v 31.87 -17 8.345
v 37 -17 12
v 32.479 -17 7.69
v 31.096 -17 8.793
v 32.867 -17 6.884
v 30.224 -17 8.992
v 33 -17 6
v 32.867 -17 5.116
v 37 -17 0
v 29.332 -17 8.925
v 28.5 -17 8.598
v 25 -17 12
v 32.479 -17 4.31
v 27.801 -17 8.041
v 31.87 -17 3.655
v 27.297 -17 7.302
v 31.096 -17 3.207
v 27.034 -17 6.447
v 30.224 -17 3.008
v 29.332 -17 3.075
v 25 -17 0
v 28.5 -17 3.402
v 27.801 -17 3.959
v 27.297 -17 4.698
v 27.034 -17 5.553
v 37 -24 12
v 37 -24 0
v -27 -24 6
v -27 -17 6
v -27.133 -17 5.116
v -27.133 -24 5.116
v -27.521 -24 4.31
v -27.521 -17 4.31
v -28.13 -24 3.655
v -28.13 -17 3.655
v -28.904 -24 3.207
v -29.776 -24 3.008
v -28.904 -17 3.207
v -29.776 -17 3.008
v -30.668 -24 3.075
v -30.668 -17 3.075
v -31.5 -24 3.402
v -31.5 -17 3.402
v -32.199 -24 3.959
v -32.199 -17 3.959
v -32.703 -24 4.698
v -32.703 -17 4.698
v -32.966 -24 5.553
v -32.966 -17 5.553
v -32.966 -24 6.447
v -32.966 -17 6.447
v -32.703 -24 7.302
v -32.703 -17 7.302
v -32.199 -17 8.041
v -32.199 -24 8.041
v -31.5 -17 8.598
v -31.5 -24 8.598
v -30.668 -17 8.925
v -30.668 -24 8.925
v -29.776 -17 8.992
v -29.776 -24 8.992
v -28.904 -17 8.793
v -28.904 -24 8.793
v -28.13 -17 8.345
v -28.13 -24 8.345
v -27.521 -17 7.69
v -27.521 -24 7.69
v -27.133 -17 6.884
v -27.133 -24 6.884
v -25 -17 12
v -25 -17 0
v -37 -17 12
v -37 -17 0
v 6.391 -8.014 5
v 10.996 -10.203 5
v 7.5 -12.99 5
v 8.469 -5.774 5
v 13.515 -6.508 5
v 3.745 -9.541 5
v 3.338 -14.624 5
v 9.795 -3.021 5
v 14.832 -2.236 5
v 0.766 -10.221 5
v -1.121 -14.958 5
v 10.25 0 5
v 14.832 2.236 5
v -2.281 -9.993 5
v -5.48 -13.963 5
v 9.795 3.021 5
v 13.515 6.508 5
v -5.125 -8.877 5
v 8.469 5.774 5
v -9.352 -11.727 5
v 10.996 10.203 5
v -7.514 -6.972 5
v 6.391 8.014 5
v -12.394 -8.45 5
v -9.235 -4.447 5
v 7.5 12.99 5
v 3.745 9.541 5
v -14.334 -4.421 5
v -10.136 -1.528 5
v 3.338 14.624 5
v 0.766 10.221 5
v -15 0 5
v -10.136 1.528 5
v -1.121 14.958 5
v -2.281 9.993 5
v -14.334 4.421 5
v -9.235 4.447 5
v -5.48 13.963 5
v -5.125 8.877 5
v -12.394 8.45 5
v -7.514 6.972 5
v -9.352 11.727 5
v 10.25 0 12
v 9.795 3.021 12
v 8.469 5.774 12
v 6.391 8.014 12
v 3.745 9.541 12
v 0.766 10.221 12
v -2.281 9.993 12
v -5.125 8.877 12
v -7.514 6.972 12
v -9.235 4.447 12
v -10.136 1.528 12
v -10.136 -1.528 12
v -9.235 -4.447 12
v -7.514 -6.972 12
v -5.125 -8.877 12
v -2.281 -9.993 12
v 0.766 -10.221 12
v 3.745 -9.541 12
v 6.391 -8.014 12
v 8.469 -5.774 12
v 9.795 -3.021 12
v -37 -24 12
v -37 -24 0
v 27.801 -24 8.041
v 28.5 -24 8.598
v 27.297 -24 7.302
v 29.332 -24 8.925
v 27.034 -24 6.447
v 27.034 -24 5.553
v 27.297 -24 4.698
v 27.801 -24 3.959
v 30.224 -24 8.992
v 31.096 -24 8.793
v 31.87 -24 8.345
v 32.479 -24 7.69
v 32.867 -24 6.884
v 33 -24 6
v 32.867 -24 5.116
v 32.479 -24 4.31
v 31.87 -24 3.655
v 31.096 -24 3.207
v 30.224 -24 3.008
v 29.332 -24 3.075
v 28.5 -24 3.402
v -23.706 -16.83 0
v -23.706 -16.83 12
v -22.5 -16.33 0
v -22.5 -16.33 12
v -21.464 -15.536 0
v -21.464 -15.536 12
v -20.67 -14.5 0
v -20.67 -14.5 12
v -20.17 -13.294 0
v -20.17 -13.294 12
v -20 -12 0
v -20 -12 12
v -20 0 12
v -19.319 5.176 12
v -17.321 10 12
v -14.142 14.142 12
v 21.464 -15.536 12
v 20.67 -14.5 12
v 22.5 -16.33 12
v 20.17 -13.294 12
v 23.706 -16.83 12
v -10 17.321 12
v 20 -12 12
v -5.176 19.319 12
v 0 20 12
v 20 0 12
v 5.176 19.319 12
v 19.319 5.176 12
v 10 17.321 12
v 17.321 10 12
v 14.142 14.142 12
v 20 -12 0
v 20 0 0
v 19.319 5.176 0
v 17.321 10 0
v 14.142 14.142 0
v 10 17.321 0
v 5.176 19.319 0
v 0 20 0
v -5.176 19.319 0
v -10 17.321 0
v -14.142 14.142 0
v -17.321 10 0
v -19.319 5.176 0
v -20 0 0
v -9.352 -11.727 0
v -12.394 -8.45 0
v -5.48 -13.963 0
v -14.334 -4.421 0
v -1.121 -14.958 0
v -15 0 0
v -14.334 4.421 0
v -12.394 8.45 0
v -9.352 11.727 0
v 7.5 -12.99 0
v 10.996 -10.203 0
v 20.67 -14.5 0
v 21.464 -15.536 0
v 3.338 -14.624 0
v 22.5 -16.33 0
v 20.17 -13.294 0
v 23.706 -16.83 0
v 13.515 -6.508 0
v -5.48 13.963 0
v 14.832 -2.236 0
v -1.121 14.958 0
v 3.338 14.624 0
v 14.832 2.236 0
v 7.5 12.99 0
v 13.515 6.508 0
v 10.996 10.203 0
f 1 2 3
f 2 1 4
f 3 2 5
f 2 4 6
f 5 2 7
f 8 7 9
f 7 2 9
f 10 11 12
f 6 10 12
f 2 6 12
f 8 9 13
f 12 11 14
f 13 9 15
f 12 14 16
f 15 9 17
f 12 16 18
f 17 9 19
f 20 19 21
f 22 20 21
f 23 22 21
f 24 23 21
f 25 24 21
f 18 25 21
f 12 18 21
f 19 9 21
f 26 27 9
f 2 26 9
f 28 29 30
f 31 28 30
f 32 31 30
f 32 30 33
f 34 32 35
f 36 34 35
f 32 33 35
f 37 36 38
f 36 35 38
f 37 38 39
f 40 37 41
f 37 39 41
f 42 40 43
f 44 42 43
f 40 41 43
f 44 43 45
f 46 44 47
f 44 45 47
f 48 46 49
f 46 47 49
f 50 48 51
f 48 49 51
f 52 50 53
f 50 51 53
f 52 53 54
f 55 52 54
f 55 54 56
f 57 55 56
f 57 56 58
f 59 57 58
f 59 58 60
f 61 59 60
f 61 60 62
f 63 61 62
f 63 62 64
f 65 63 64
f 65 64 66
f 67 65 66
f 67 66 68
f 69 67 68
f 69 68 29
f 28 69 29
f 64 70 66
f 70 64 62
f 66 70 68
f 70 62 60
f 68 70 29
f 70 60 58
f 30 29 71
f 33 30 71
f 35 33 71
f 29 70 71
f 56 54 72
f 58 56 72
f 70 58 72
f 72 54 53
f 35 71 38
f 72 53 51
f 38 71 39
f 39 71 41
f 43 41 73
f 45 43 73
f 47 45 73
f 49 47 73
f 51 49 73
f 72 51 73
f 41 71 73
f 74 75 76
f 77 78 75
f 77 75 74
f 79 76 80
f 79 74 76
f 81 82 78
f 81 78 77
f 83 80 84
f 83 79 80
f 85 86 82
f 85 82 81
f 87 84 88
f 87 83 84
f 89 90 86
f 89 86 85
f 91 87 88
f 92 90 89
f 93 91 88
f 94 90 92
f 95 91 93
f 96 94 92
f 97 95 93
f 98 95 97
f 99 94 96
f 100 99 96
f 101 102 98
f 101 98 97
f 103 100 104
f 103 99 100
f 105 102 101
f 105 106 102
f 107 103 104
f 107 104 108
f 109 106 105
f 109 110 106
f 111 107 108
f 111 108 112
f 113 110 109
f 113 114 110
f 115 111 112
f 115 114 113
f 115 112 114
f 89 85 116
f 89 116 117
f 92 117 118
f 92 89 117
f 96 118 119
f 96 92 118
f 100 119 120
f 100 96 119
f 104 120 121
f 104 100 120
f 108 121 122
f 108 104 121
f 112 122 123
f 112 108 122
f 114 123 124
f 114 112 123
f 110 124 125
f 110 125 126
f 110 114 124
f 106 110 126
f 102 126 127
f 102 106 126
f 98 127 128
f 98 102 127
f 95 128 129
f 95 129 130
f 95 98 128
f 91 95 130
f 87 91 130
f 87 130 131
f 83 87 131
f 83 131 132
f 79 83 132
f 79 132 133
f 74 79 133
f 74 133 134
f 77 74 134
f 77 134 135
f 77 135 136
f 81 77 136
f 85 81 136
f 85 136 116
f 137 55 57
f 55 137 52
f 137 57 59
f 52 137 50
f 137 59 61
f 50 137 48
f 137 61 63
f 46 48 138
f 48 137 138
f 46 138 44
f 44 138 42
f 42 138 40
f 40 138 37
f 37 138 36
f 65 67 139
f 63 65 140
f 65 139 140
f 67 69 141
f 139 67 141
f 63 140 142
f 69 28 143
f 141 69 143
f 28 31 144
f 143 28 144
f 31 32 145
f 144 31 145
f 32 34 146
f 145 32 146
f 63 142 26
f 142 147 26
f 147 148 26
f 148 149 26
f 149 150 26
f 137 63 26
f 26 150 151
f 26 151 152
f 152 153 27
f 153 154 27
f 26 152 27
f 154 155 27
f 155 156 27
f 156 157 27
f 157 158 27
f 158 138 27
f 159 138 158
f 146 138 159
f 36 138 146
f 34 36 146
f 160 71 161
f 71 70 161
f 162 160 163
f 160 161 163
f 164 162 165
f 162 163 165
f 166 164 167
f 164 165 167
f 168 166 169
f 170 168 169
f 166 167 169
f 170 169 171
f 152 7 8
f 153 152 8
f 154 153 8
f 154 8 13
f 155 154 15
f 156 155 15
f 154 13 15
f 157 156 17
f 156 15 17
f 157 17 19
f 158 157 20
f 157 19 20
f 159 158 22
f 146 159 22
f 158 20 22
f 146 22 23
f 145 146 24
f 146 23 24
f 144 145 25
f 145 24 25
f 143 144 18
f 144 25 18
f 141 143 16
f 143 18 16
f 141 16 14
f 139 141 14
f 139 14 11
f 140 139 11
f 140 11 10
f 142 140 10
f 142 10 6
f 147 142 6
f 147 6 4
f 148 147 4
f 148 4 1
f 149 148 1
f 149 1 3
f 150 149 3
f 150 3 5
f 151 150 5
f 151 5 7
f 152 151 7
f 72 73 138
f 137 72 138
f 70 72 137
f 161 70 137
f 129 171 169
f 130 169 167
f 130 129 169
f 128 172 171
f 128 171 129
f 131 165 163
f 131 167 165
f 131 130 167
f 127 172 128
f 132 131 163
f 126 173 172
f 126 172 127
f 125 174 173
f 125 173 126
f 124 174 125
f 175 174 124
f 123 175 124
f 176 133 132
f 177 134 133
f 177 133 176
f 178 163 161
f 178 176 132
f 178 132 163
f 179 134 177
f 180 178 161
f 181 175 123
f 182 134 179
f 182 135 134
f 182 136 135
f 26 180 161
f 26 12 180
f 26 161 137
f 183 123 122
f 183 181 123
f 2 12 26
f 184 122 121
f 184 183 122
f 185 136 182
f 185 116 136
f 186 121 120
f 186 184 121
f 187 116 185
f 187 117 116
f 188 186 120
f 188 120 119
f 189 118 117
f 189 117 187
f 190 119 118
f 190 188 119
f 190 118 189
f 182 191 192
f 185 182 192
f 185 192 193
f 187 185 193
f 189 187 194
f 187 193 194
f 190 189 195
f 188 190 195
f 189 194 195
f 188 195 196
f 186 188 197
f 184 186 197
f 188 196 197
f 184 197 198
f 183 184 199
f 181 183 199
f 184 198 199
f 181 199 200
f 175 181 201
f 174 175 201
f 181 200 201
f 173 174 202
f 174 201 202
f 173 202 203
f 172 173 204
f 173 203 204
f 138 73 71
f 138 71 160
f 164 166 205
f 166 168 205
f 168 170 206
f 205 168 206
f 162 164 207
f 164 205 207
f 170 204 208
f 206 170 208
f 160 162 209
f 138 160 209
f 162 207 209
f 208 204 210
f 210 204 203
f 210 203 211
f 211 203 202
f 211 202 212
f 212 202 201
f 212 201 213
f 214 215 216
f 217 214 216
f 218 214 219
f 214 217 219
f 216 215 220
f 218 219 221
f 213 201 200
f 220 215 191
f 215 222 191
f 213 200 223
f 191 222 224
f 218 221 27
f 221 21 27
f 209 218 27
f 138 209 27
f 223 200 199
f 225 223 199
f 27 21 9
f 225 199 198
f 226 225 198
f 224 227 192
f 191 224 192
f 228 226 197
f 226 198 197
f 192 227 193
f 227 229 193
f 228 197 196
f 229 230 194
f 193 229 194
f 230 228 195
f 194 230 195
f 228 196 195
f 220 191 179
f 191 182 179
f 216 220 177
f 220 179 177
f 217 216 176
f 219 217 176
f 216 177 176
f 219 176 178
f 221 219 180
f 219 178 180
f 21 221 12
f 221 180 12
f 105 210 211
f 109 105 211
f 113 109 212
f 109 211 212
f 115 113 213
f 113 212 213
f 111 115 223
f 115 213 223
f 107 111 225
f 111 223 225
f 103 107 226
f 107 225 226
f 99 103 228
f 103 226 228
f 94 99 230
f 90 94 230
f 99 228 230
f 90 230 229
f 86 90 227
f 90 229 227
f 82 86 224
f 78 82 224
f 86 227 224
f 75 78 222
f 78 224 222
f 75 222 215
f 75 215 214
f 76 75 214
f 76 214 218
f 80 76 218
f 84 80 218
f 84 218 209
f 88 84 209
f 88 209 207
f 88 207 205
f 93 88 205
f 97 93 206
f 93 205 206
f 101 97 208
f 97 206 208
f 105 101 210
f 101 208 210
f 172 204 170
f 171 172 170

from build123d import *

# Parameters (mm, degrees)
SKETCH1_R           = 10.25
BOSS_EXTRUDE1_DEPTH = 12
SKETCH2_R           = 3
CUT_EXTRUDE1_DEPTH  = 8
SKETCH3_R           = 15
CUT_EXTRUDE2_DEPTH  = 5
BOSS_EXTRUDE2_DEPTH = 12
FILLET2_R           = 5


with BuildPart() as part:
    # Sketch1 → Boss-Extrude1 (new body)
    with BuildSketch(Plane.XY):
        with BuildLine():
            Line((-10.535653753, -17), (-37, -17))
            Line((-37, -17), (-37, -24))
            Line((-37, -24), (0, -24))
            Line((0, -24), (37, -24))
            Line((37, -24), (37, -17))
            Line((37, -17), (10.535653753, -17))
            ThreePointArc((10.535653753, -17), (0, 20), (-10.535653753, -17))
        make_face()
        Circle(SKETCH1_R, mode=Mode.SUBTRACT)
    extrude(amount=BOSS_EXTRUDE1_DEPTH)

    # Sketch2 → Cut-Extrude1 (cut, through all)
    with BuildSketch(Plane(origin=(0, -17, 0), x_dir=(1, 0, 0), z_dir=(0, 1, 0))):
        with Locations((30, -6)):
            Circle(SKETCH2_R)
        with Locations((-30, -6)):
            Circle(SKETCH2_R)
    extrude(amount=-CUT_EXTRUDE1_DEPTH, mode=Mode.SUBTRACT)

    # Sketch3 → Cut-Extrude2 (cut)
    with BuildSketch(Plane(origin=(0, 0, 0), x_dir=(-1, 0, 0), z_dir=(0, 0, -1))):
        Circle(SKETCH3_R)
    extrude(amount=-CUT_EXTRUDE2_DEPTH, mode=Mode.SUBTRACT)

    # Sketch4 → Boss-Extrude2 (add, through all)
    with BuildSketch(Plane(origin=(0, 0, 0), x_dir=(-1, 0, 0), z_dir=(0, 0, -1))):
        Polygon((-20, 0), (-10.535653753, -17), (-20, -17), align=None)
        Polygon((20, 0), (20, -17), (10.535653753, -17), align=None)
    extrude(amount=-BOSS_EXTRUDE2_DEPTH)

    # Fillet2
    fillet2_edges = [part.edges().sort_by_distance(p)[0] for p in [
        (-20, -17, 6),
        (20, -17, 6),
    ]]
    fillet(fillet2_edges, radius=FILLET2_R)


solid = part.part
